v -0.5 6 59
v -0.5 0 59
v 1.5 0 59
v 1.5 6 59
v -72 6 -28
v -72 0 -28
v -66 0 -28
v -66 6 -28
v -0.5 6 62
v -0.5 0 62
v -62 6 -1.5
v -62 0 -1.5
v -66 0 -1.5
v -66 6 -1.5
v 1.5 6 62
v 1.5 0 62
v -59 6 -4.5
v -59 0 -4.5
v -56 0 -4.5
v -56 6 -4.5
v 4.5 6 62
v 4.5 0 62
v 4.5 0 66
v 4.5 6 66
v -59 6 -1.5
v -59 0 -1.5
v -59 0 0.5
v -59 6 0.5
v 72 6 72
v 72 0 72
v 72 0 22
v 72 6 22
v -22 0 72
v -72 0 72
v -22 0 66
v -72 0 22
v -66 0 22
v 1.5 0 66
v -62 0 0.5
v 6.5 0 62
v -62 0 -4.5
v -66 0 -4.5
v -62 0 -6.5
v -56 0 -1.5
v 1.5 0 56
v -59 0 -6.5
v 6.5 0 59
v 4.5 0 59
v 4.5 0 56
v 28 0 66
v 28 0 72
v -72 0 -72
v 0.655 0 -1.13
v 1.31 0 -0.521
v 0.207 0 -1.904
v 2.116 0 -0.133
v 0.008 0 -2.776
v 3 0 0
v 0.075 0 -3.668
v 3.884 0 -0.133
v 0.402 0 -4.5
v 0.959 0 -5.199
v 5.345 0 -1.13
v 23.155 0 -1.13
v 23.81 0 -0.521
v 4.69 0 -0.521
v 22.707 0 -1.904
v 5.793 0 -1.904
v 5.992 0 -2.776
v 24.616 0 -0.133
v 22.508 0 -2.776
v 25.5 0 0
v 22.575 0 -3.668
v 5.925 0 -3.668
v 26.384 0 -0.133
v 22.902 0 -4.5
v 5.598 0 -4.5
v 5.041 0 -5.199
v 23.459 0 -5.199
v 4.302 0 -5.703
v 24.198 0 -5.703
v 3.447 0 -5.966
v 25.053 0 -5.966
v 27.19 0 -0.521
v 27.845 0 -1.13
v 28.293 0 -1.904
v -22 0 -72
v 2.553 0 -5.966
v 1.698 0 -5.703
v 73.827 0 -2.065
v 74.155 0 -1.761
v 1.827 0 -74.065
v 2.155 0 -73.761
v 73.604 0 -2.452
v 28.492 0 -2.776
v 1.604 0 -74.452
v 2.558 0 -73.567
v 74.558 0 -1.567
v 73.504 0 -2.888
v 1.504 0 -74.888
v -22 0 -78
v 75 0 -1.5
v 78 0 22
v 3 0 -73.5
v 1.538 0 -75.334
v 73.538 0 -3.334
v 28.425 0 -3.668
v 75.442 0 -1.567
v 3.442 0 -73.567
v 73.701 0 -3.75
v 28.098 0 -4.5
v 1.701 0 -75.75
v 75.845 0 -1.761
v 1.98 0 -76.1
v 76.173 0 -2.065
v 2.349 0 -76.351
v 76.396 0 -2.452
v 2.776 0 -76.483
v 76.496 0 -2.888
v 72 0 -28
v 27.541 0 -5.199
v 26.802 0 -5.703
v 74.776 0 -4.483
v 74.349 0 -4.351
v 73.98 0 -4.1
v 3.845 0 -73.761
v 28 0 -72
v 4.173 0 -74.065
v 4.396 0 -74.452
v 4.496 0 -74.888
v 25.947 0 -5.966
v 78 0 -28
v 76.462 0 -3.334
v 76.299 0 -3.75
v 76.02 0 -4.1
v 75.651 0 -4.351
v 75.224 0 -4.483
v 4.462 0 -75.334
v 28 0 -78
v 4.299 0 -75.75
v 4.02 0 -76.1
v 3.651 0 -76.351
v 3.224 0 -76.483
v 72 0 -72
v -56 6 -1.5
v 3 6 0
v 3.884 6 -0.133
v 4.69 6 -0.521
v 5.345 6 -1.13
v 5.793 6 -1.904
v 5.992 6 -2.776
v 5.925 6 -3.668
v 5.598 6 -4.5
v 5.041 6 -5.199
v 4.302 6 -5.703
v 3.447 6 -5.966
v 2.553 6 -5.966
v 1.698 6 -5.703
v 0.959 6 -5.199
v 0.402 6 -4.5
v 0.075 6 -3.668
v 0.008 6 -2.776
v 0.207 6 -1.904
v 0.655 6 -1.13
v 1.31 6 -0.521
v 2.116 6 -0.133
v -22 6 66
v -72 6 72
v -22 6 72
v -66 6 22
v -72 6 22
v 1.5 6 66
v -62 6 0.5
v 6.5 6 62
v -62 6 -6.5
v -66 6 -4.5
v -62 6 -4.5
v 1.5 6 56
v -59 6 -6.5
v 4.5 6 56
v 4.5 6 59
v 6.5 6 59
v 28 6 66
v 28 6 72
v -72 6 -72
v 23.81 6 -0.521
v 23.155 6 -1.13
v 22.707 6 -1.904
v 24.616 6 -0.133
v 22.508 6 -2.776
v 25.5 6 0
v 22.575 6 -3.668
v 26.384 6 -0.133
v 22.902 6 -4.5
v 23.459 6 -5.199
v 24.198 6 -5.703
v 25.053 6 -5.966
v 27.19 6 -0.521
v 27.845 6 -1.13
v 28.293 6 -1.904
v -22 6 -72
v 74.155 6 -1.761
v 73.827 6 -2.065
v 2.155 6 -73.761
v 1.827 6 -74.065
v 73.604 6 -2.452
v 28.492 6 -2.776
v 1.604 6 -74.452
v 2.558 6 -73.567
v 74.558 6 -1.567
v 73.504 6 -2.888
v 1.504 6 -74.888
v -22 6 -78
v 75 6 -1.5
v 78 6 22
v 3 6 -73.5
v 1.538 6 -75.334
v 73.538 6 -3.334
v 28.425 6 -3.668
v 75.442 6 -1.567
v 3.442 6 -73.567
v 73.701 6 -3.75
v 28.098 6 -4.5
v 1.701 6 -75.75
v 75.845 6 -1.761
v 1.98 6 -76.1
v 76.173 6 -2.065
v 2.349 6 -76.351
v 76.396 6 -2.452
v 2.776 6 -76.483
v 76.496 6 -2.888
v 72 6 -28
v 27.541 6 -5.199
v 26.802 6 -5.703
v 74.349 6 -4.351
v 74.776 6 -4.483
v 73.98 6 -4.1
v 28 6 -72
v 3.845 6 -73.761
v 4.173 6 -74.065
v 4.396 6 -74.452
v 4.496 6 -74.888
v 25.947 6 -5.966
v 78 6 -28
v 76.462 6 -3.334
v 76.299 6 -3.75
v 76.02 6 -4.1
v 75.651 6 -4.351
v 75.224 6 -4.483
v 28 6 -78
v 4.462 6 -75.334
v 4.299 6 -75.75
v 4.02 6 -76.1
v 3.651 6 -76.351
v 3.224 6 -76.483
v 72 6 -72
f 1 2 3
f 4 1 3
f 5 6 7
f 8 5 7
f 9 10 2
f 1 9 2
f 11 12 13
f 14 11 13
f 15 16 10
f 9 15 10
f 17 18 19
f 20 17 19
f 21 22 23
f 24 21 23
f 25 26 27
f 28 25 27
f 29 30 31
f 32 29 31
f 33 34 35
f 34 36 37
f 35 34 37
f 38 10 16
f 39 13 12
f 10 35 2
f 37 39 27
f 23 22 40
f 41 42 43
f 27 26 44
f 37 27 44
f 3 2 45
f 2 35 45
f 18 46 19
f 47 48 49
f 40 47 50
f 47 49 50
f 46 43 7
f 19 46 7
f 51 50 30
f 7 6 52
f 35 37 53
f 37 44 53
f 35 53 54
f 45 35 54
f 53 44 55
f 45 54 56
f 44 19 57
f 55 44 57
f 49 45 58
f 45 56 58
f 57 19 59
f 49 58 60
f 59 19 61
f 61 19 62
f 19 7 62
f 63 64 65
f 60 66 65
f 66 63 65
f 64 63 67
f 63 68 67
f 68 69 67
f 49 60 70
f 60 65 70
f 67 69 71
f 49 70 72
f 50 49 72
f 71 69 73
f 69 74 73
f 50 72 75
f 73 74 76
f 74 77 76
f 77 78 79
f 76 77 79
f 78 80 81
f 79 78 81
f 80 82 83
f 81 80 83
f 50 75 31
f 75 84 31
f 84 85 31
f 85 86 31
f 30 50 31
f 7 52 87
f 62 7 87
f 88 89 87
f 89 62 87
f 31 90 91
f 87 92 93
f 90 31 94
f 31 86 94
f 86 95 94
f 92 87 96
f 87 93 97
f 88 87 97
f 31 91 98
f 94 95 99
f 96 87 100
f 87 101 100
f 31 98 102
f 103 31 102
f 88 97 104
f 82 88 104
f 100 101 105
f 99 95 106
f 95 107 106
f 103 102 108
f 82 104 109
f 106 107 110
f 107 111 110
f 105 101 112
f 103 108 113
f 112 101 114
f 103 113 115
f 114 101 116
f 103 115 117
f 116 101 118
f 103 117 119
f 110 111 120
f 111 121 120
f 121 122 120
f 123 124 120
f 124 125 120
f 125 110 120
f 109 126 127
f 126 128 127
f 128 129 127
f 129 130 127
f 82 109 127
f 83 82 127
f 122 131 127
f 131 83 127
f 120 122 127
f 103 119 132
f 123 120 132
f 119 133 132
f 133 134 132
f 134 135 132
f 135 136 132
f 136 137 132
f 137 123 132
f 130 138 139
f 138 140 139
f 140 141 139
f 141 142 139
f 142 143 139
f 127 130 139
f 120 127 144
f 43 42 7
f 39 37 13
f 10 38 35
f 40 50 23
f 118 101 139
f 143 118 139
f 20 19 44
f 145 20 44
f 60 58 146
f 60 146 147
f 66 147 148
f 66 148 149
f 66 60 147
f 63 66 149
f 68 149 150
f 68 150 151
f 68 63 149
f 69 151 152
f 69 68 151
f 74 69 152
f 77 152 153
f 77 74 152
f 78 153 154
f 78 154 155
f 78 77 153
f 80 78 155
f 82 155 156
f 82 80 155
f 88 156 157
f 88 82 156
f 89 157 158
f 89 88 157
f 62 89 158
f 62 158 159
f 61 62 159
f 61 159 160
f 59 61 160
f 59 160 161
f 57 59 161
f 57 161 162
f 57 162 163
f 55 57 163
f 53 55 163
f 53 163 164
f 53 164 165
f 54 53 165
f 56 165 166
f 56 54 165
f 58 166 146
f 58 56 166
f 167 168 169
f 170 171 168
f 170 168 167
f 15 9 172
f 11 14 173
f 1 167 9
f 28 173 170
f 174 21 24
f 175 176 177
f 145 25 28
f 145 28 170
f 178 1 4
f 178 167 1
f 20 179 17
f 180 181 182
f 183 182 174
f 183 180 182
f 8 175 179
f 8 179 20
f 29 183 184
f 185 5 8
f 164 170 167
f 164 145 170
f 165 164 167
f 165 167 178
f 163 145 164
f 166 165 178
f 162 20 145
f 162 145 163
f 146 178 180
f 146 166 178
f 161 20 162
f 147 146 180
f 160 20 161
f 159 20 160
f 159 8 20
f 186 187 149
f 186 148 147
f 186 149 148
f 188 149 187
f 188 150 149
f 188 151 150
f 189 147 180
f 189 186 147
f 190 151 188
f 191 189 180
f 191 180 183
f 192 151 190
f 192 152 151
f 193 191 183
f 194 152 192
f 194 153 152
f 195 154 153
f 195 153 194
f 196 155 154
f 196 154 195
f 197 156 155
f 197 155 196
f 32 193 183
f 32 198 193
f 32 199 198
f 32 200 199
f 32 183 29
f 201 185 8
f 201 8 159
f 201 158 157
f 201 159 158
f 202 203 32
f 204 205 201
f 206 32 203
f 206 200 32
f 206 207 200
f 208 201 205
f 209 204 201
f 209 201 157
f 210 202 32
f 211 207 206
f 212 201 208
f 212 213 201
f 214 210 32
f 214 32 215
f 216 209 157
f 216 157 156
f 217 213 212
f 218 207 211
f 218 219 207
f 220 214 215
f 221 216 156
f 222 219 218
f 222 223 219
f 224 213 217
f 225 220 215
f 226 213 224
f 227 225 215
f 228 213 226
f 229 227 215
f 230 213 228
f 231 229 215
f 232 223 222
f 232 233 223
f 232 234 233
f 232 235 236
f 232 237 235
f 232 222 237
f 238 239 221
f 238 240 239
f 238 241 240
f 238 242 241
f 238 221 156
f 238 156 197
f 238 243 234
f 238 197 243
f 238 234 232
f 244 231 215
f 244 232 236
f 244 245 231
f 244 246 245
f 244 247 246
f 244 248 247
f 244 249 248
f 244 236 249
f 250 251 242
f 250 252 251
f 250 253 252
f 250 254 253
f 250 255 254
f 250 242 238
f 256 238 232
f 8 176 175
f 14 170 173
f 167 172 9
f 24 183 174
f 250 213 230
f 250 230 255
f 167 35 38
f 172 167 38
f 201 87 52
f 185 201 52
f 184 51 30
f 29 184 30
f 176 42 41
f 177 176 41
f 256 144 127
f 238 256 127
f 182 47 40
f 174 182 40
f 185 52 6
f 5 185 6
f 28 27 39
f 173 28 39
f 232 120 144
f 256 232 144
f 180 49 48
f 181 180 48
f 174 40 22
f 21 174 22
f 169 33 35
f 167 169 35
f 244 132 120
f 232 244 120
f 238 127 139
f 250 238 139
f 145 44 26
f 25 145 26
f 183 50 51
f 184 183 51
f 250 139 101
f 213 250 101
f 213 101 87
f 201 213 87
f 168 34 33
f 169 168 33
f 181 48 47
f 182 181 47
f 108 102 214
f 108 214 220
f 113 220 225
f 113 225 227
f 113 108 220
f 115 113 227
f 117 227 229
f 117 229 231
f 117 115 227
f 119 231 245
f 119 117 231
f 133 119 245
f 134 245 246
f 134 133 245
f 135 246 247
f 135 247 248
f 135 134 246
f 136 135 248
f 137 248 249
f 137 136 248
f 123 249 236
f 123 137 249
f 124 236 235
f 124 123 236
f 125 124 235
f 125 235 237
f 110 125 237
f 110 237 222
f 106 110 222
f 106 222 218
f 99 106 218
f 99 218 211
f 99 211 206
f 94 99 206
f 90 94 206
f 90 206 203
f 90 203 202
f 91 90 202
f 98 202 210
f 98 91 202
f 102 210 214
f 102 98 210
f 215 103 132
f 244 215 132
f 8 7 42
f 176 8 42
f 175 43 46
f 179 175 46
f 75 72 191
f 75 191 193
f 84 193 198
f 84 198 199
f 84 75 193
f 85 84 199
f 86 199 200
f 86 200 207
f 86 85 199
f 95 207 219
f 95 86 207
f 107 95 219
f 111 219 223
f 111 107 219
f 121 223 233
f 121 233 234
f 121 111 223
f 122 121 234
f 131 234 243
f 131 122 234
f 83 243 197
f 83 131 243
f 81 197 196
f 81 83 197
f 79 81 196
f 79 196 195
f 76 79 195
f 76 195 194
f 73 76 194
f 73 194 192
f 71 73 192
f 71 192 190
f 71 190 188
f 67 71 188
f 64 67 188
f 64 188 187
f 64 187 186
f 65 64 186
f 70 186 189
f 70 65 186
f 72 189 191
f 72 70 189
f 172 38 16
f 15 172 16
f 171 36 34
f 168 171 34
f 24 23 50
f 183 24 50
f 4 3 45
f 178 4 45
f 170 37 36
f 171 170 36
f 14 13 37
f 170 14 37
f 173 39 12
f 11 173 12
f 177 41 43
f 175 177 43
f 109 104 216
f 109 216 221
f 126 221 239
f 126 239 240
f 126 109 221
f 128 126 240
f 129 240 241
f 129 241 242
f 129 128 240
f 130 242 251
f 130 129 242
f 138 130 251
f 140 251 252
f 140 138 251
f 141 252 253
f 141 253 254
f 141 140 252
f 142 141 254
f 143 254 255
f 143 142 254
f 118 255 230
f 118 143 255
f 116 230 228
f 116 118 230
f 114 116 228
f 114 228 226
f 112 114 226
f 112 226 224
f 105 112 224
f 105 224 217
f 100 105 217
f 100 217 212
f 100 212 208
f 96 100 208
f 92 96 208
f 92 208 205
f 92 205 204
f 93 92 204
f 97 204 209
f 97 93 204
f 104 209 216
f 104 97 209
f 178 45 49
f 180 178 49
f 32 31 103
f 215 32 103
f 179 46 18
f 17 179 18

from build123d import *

# Parameters (mm, degrees)
SKETCH1_R           = 3
SKETCH1_R_2         = 1.5
BOSS_EXTRUDE1_DEPTH = 6


with BuildPart() as part:
    # Sketch1 → Boss-Extrude1 (new body)
    with BuildSketch(Plane(origin=(0, 0, 0), x_dir=(1, 0, 0), z_dir=(0, 1, 0))):
        Polygon((-72, 72), (-72, 28), (-66, 28), (-66, 4.5), (-62, 4.5), (-62, 6.5), (-59, 6.5), (-59, 4.5), (-56, 4.5), (-56, 1.5), (-59, 1.5), (-59, -0.5), (-62, -0.5), (-62, 1.5), (-66, 1.5), (-66, -22), (-72, -22), (-72, -72), (-22, -72), (-22, -66), (1.5, -66), (1.5, -62), (-0.5, -62), (-0.5, -59), (1.5, -59), (1.5, -56), (4.5, -56), (4.5, -59), (6.5, -59), (6.5, -62), (4.5, -62), (4.5, -66), (28, -66), (28, -72), (72, -72), (72, -22), (78, -22), (78, 28), (72, 28), (72, 72), (28, 72), (28, 78), (-22, 78), (-22, 72), align=None)
        with Locations(Location((3, 3, 0), (0, 0, 270))):
            Circle(SKETCH1_R, mode=Mode.SUBTRACT)
        with Locations(Location((25.5, 3, 0), (0, 0, 270))):
            Circle(SKETCH1_R, mode=Mode.SUBTRACT)
        with Locations(Location((3, 75, 0), (0, 0, 270))):
            Circle(SKETCH1_R_2, mode=Mode.SUBTRACT)
        with Locations(Location((75, 3, 0), (0, 0, 270))):
            Circle(SKETCH1_R_2, mode=Mode.SUBTRACT)
    extrude(amount=BOSS_EXTRUDE1_DEPTH)


solid = part.part
